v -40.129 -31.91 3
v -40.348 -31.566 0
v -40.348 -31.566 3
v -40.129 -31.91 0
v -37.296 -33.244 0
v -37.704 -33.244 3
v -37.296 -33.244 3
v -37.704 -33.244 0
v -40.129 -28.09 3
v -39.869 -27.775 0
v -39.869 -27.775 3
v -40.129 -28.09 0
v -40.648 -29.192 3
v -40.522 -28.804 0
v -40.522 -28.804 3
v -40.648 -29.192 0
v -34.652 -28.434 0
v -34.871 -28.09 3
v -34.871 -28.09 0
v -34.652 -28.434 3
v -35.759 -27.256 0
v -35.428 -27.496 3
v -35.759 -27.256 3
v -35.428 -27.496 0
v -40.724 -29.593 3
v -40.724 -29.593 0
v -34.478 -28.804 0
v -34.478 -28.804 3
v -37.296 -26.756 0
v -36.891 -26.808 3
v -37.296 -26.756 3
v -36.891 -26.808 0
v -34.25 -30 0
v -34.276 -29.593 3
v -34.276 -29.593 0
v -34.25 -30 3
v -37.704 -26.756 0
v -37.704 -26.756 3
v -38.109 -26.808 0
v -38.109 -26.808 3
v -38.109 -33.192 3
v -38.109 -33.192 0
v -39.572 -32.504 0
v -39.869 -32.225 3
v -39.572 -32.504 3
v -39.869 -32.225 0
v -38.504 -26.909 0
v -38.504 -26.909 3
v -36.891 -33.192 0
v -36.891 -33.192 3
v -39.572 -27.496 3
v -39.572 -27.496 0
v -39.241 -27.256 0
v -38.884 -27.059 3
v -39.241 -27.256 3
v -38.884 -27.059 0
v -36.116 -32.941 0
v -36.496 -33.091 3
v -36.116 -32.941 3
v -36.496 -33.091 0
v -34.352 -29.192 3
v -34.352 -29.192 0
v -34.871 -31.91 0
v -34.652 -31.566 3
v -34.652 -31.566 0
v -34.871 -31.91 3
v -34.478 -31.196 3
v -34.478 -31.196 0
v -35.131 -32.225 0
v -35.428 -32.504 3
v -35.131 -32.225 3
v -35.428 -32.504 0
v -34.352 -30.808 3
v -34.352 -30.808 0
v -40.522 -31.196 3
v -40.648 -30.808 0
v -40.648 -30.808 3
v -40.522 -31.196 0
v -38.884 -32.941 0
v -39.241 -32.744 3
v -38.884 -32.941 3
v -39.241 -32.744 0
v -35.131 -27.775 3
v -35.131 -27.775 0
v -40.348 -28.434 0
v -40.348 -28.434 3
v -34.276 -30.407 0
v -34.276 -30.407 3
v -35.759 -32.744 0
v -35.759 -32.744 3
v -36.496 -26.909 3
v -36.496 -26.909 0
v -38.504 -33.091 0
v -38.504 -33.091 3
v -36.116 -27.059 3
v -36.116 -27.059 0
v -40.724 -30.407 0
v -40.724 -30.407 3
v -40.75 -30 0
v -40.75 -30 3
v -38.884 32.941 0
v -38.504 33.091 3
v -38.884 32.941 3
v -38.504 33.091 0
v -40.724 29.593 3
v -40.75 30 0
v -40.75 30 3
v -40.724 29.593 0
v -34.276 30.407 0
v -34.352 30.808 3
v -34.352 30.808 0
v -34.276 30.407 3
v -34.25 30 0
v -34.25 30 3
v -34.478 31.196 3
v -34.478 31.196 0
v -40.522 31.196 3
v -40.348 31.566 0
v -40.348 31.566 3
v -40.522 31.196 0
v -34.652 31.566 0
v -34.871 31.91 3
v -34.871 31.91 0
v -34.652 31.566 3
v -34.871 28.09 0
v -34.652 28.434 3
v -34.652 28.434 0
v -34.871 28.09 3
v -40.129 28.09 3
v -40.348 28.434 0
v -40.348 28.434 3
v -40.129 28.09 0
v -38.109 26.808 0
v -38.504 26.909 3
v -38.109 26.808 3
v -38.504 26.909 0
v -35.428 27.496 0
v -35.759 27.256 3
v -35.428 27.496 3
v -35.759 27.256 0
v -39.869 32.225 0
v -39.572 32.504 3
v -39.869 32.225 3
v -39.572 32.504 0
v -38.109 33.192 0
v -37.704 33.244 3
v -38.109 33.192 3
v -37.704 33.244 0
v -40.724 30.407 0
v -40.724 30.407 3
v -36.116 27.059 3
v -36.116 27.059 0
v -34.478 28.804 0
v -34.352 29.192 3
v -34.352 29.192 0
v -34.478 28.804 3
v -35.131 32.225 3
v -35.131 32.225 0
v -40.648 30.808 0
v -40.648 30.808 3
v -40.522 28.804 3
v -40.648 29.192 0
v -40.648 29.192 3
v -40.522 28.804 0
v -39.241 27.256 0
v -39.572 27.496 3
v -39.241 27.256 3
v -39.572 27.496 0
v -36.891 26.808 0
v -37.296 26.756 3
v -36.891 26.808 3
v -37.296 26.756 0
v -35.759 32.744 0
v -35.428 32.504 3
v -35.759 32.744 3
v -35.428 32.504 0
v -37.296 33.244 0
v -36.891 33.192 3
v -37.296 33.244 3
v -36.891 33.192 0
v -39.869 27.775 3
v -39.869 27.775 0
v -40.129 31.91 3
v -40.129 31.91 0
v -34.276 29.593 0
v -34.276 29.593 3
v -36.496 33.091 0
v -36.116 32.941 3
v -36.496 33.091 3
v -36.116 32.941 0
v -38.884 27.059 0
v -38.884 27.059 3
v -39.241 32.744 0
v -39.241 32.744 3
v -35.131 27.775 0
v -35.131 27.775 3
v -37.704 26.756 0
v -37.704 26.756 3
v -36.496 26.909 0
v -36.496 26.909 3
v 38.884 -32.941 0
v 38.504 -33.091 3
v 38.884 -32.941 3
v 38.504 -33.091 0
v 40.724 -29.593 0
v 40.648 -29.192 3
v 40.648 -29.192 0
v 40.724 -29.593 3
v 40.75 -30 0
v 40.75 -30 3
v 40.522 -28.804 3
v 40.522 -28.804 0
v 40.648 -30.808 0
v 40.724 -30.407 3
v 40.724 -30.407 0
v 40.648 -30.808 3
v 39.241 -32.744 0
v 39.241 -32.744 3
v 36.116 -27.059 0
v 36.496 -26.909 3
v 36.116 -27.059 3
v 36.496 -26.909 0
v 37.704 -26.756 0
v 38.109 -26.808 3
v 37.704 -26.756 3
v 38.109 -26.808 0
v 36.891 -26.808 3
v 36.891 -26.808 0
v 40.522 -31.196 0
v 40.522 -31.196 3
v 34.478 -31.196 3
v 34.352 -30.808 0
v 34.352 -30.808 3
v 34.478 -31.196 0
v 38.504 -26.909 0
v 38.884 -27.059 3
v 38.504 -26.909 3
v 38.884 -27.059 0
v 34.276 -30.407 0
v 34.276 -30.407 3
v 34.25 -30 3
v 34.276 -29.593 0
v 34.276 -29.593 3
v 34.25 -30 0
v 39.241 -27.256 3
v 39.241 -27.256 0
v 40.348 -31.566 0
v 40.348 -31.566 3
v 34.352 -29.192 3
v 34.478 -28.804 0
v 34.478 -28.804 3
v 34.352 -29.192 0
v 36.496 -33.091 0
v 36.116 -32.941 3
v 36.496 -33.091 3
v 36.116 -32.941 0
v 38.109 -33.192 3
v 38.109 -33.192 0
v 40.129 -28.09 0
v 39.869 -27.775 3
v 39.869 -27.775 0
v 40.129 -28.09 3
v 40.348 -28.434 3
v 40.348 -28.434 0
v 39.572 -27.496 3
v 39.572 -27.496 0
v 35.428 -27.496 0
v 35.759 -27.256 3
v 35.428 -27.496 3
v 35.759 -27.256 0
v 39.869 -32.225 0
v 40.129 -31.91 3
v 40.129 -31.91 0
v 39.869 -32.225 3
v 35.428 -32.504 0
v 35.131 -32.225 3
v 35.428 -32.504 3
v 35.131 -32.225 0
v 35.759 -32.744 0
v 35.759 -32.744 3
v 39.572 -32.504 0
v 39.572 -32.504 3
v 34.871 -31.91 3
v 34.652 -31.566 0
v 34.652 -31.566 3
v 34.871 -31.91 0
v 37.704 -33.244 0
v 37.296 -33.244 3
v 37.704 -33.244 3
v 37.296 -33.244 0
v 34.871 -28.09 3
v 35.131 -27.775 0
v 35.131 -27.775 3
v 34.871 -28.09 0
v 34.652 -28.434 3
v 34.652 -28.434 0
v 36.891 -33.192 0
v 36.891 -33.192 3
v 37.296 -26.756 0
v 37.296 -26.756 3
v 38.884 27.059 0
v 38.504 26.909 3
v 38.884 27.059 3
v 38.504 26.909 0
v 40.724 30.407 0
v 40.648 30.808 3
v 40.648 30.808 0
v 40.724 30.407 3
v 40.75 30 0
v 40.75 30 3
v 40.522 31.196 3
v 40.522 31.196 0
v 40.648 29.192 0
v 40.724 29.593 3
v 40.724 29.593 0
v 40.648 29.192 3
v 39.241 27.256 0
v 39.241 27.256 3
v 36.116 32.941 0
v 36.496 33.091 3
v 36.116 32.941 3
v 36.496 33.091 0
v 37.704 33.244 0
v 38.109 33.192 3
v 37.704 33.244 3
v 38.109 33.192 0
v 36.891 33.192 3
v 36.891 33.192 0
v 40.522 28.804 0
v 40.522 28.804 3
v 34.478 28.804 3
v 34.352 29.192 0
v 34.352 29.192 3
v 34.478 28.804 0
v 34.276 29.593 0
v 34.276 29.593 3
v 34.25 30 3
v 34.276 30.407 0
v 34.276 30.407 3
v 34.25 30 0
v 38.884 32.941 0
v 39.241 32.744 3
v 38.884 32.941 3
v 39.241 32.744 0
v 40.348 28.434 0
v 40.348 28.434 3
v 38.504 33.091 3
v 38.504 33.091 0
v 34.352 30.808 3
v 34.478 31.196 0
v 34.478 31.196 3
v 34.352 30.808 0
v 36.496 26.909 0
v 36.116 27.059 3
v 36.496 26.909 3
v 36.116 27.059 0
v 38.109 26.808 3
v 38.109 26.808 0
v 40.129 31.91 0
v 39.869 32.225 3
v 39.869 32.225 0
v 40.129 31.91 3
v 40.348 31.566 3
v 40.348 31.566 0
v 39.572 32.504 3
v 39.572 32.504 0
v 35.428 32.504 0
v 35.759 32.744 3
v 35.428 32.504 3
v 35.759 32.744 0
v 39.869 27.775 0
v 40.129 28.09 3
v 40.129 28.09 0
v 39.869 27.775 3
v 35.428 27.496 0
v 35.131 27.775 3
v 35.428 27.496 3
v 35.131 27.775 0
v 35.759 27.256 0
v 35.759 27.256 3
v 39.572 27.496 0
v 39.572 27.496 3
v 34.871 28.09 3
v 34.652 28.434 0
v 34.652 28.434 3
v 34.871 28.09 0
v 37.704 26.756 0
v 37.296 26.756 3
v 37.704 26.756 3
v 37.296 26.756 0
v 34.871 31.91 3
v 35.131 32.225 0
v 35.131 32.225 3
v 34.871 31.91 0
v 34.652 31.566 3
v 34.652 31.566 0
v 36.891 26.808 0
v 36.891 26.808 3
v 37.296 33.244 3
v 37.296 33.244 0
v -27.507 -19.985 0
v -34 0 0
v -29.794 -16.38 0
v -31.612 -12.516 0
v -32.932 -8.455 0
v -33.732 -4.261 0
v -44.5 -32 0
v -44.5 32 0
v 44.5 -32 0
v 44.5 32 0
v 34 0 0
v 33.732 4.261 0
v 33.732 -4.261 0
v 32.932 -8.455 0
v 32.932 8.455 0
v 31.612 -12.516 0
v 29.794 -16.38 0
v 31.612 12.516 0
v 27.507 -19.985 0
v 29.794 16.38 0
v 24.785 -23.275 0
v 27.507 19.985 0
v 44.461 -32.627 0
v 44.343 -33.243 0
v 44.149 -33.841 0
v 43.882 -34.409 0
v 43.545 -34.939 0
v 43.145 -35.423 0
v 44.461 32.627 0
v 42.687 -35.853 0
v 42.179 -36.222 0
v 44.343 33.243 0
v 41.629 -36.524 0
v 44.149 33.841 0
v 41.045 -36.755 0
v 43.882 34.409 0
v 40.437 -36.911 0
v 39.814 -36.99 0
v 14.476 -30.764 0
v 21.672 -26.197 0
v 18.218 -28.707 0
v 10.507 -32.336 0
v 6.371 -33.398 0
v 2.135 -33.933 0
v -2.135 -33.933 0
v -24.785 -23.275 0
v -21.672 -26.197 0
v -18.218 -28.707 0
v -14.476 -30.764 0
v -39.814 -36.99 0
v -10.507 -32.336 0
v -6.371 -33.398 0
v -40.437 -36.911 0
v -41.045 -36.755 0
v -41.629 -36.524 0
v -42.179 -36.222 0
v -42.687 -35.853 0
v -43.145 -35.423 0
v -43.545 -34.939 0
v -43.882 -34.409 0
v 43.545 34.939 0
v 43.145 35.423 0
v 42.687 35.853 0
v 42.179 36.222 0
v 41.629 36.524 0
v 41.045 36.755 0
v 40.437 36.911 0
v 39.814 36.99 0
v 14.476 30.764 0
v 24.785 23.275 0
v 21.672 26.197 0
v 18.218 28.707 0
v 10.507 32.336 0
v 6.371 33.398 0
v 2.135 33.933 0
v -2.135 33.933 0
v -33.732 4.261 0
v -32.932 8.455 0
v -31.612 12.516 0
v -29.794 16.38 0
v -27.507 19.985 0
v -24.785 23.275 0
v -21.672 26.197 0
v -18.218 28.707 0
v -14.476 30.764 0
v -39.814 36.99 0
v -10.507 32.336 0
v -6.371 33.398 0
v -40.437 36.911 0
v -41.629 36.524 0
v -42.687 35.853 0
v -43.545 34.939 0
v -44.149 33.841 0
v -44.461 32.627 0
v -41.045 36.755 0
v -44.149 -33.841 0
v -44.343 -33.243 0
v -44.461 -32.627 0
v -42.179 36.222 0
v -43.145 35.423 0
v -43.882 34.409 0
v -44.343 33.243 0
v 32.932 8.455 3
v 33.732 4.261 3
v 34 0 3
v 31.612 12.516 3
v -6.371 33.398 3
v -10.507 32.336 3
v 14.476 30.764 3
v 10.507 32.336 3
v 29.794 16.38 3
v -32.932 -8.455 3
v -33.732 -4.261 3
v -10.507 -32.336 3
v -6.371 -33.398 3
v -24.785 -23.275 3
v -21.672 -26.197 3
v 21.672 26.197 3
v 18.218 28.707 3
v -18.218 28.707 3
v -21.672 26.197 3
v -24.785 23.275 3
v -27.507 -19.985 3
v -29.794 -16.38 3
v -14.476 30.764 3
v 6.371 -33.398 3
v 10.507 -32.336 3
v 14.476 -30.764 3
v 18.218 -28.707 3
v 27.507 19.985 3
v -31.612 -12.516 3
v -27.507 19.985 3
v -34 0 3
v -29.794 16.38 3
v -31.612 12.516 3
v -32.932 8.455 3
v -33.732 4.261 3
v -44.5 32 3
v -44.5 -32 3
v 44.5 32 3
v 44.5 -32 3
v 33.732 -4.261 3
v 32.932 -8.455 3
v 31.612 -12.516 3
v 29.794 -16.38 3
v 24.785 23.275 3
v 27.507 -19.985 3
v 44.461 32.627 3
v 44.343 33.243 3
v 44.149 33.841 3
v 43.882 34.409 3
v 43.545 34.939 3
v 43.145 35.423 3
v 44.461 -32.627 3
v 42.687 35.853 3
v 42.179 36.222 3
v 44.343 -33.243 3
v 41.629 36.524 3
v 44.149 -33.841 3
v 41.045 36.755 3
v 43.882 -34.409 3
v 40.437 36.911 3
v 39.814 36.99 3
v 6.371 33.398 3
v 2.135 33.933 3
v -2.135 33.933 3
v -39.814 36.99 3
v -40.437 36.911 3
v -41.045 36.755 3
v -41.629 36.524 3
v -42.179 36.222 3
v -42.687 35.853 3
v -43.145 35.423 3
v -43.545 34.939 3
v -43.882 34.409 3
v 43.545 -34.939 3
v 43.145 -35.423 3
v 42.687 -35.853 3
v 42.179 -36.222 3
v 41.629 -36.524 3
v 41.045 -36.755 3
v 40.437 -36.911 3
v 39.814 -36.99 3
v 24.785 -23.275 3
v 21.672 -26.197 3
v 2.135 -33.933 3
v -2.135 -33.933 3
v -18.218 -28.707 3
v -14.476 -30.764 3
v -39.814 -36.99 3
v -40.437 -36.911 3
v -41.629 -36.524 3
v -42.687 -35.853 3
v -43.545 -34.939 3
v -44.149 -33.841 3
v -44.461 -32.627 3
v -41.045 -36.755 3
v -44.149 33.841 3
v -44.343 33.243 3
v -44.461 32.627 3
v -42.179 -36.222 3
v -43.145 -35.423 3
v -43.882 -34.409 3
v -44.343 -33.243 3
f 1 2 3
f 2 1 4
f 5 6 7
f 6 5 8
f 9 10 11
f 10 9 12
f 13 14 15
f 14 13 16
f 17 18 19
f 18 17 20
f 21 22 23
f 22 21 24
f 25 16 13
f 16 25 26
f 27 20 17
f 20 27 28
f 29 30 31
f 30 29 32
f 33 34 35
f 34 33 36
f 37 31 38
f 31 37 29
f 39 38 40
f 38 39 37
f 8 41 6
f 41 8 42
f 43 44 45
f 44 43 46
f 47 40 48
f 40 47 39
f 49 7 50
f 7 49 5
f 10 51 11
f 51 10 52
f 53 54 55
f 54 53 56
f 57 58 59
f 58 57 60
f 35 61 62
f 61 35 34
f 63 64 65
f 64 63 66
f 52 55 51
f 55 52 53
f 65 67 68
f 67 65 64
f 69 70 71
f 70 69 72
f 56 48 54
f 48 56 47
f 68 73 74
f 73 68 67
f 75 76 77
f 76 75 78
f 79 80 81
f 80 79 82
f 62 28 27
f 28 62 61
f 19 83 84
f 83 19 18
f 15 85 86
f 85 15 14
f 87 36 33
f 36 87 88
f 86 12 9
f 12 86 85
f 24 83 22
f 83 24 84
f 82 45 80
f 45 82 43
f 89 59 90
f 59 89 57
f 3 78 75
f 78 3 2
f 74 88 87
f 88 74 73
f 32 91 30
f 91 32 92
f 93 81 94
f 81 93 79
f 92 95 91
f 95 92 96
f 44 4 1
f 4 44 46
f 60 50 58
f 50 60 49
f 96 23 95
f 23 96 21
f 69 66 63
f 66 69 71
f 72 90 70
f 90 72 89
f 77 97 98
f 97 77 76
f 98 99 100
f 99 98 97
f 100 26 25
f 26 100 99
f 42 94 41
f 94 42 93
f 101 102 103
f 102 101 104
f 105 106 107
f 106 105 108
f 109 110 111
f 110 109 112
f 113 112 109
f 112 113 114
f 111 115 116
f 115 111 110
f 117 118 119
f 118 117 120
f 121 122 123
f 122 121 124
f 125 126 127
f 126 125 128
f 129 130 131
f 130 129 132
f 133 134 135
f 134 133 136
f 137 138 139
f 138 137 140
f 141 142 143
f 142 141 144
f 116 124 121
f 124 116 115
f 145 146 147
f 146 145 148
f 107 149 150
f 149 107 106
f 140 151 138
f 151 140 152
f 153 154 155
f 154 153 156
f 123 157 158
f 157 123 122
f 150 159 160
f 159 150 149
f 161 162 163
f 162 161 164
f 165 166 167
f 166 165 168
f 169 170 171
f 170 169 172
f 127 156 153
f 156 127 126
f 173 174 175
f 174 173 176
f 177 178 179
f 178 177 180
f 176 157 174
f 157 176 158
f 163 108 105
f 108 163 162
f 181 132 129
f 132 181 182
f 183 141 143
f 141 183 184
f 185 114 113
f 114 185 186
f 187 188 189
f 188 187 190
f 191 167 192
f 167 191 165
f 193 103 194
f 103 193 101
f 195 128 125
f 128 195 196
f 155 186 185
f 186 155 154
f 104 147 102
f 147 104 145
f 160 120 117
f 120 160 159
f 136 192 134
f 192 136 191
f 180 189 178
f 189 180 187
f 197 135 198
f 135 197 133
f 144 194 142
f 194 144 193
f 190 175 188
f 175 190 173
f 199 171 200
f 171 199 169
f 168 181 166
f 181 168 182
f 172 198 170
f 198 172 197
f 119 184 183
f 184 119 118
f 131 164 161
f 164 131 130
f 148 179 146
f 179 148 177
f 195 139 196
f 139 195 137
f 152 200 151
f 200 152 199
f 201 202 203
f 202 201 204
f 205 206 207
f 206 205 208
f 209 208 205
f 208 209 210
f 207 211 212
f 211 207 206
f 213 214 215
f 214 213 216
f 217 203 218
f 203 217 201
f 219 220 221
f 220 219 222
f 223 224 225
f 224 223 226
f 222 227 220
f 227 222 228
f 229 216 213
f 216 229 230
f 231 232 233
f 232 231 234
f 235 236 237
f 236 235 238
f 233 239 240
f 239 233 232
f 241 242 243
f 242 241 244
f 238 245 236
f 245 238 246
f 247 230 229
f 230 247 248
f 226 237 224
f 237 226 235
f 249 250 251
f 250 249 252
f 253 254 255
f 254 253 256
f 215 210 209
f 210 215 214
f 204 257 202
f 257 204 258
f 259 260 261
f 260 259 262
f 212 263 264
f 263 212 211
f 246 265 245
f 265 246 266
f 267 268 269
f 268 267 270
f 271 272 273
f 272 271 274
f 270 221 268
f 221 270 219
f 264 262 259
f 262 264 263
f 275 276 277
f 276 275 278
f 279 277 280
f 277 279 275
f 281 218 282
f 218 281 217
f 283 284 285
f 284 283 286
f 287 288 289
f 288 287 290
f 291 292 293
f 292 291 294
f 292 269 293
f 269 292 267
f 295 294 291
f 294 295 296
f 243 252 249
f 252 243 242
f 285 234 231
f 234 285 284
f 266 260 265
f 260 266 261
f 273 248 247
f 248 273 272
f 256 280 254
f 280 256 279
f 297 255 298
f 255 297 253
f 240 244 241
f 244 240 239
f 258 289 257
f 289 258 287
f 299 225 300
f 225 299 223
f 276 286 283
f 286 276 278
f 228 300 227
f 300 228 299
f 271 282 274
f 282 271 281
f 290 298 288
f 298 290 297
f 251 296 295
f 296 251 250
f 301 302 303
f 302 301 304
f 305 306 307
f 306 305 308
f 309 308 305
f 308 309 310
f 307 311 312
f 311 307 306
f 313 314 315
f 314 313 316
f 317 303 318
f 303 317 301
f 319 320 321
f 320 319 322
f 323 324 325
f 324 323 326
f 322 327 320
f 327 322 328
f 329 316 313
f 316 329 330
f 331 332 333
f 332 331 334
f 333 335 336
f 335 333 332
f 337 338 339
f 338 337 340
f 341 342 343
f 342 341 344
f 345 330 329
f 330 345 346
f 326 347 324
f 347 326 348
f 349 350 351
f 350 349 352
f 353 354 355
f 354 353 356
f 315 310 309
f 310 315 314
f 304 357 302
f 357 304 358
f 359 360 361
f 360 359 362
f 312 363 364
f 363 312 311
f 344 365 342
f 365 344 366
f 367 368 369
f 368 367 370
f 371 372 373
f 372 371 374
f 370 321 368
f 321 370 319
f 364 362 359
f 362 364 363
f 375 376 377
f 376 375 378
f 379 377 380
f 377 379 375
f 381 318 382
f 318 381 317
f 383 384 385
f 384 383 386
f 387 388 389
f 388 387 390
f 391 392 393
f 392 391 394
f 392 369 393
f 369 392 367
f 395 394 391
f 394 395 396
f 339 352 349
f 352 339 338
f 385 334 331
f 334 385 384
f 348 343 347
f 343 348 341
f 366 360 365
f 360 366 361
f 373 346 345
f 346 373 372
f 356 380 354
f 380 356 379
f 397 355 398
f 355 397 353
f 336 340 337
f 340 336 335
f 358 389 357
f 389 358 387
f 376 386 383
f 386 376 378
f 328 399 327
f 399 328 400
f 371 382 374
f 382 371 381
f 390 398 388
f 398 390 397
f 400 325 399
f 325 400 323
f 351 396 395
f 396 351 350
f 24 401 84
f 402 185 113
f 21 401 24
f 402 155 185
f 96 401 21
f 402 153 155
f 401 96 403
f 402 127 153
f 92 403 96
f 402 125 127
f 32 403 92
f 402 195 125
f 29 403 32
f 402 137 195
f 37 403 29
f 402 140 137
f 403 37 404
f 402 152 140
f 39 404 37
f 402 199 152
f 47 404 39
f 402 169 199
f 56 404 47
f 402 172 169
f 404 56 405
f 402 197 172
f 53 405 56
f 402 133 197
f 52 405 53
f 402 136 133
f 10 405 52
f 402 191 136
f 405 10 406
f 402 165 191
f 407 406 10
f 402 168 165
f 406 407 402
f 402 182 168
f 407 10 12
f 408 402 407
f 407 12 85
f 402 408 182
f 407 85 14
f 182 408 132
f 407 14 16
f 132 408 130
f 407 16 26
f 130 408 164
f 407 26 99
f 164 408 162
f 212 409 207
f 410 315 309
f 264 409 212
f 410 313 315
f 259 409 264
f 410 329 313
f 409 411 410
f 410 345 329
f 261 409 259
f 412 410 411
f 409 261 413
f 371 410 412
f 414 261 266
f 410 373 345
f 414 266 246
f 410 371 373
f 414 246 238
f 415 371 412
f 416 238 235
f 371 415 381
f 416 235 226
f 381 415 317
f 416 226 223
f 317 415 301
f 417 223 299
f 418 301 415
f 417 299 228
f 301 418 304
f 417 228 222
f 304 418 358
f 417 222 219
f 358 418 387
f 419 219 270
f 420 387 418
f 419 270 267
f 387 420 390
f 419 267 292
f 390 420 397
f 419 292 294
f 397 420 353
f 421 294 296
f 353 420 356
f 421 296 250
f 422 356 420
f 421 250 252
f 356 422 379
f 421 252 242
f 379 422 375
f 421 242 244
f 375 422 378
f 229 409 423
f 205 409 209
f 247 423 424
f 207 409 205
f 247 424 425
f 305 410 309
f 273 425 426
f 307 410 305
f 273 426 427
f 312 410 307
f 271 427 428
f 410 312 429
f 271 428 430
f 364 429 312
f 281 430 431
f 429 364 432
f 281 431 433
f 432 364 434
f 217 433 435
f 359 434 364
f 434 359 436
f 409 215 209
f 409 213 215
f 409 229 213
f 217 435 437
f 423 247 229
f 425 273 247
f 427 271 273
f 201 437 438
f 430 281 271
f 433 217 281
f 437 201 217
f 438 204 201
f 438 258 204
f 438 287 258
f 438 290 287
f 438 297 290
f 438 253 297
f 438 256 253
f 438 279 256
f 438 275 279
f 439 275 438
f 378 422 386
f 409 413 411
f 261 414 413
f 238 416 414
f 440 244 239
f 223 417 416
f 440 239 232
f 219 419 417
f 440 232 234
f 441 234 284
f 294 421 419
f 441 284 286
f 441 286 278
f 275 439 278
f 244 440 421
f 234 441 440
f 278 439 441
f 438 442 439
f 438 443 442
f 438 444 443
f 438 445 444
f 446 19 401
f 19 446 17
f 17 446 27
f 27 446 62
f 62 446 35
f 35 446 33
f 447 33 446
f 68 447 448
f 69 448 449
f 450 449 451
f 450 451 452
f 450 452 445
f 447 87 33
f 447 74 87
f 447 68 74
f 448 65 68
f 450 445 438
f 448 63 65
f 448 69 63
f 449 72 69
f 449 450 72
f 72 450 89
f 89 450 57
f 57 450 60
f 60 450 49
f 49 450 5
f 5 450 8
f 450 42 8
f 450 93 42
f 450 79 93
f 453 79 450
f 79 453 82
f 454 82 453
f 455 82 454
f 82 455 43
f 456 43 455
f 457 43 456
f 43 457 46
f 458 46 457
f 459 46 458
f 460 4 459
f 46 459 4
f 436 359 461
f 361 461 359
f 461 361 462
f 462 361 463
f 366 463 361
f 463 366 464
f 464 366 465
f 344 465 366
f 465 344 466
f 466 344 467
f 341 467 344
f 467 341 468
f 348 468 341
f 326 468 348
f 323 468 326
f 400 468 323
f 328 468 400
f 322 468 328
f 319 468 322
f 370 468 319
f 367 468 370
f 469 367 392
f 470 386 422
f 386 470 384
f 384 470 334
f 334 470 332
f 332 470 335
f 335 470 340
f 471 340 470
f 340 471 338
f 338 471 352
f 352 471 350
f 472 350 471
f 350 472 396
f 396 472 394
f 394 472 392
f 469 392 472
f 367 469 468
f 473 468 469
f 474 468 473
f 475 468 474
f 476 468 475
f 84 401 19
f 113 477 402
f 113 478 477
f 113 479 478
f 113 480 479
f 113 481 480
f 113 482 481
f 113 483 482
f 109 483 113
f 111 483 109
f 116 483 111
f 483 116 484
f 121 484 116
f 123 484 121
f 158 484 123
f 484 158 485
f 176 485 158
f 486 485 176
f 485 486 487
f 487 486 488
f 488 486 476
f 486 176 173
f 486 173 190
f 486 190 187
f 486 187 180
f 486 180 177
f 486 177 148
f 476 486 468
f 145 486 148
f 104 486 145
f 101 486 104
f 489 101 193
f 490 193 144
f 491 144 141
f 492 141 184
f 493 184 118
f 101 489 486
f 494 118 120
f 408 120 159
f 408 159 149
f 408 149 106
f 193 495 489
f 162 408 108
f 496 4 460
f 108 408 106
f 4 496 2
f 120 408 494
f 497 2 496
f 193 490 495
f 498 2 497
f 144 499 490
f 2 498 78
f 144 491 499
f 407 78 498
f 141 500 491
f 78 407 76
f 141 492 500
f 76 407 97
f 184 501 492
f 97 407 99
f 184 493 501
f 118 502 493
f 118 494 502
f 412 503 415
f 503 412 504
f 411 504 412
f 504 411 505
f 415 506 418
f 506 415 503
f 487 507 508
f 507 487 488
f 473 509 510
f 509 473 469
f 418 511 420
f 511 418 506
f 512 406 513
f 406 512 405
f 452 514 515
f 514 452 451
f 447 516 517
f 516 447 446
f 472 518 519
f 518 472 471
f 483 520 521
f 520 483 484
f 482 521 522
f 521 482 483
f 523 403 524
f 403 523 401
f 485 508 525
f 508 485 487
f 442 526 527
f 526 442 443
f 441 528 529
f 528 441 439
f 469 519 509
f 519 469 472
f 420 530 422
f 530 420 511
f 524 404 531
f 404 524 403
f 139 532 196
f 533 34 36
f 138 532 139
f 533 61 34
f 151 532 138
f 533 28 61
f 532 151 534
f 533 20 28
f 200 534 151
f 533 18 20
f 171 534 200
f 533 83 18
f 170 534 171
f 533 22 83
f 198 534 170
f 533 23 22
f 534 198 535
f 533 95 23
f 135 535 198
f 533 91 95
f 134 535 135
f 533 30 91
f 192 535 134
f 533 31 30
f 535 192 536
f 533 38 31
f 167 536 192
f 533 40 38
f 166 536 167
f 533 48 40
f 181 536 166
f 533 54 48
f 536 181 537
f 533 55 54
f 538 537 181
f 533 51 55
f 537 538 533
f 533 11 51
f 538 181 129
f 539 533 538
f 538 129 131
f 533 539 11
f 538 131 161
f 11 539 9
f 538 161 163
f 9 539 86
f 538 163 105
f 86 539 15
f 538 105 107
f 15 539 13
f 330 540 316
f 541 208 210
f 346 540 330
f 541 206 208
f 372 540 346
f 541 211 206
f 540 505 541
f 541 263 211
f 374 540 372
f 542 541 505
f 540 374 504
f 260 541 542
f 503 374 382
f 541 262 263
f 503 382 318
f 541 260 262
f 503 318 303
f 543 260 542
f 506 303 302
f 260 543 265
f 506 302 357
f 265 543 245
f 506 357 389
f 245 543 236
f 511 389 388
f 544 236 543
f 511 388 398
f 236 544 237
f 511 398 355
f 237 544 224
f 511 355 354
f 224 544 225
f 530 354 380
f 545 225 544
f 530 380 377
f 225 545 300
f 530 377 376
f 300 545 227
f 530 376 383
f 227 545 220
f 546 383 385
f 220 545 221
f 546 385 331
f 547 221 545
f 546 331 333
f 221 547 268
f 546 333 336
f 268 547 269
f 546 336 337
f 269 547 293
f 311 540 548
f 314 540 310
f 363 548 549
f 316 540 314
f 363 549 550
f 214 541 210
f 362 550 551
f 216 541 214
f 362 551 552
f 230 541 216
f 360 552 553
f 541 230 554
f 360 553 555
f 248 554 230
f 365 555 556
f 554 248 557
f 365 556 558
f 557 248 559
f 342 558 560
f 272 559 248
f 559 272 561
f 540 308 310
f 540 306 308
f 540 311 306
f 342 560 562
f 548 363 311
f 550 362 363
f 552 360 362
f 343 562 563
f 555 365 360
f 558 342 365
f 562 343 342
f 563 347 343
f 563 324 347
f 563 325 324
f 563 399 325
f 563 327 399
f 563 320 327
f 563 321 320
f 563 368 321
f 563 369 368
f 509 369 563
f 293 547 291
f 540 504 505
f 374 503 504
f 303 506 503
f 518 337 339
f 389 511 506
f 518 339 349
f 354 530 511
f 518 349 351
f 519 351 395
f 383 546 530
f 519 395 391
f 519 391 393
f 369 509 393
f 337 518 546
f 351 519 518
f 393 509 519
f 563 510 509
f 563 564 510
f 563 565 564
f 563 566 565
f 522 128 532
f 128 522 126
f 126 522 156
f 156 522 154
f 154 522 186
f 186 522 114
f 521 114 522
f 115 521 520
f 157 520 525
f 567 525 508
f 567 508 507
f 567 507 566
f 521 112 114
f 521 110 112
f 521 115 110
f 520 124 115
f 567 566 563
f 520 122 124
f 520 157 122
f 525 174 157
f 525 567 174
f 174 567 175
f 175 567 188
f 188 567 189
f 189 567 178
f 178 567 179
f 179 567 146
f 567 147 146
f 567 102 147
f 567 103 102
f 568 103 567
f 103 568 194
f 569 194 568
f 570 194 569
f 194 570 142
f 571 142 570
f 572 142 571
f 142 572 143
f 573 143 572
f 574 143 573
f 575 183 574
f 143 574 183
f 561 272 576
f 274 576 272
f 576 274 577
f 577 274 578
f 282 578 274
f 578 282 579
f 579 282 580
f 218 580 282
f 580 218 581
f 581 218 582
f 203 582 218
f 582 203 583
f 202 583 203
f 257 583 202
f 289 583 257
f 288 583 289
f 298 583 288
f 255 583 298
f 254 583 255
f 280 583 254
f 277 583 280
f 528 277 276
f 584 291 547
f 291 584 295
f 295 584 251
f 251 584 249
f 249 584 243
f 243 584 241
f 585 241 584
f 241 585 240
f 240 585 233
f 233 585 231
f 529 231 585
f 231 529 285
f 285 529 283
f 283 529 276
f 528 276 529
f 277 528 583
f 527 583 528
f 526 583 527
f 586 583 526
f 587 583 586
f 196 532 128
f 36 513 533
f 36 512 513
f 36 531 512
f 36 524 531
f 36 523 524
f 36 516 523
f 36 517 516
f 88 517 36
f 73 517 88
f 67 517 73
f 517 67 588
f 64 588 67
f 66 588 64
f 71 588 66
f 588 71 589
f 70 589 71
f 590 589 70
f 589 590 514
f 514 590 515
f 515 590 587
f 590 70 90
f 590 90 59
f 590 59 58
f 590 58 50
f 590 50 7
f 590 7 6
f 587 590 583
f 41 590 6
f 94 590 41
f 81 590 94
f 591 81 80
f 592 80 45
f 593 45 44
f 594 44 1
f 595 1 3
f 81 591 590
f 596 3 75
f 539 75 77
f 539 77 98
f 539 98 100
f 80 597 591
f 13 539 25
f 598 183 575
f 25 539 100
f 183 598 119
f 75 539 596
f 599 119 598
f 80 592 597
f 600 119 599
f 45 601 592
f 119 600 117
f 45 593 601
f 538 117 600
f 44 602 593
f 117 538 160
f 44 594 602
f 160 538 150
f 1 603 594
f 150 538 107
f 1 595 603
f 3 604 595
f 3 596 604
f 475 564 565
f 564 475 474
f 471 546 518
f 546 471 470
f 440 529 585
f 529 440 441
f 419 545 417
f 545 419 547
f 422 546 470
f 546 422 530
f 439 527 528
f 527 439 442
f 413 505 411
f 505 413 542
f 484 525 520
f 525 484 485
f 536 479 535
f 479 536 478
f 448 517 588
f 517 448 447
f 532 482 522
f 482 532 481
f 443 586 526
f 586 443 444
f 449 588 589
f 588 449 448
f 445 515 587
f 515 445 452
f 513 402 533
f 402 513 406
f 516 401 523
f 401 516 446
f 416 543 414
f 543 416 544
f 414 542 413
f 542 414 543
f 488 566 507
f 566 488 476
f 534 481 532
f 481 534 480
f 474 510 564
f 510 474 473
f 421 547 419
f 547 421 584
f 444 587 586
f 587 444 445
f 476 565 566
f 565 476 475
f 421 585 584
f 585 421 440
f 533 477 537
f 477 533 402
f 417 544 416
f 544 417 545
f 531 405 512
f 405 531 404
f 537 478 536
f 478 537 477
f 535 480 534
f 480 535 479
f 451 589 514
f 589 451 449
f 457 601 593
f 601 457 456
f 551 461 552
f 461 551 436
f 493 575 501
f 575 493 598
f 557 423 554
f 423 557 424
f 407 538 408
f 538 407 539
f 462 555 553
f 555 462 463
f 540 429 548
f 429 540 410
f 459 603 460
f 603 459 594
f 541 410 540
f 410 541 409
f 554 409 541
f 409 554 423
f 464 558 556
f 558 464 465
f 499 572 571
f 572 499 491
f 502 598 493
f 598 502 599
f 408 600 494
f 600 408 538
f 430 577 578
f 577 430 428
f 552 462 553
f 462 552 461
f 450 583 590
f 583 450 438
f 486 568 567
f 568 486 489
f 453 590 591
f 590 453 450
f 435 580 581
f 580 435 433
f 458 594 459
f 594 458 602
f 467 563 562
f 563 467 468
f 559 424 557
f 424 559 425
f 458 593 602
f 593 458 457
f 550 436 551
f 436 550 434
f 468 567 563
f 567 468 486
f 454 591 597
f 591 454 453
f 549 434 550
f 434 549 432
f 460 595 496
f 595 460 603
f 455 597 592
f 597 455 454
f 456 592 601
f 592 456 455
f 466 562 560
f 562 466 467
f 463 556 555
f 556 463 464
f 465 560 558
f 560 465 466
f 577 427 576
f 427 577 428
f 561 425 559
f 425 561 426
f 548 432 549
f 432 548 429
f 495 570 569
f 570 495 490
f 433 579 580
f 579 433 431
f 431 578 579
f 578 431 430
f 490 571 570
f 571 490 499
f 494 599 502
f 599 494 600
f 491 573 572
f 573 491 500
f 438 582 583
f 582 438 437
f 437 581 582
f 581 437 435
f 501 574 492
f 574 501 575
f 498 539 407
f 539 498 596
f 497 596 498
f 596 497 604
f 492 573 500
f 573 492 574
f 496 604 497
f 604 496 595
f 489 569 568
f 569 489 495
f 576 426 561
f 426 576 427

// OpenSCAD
$fn = 50;


difference() {
	union() {
		hull() {
			translate(v = [-39.5000000000, 32.0000000000, 0]) {
				cylinder(h = 3, r = 5);
			}
			translate(v = [39.5000000000, 32.0000000000, 0]) {
				cylinder(h = 3, r = 5);
			}
			translate(v = [-39.5000000000, -32.0000000000, 0]) {
				cylinder(h = 3, r = 5);
			}
			translate(v = [39.5000000000, -32.0000000000, 0]) {
				cylinder(h = 3, r = 5);
			}
		}
	}
	union() {
		#translate(v = [-37.5000000000, -30.0000000000, -100.0000000000]) {
			cylinder(h = 200, r = 3.2500000000);
		}
		#translate(v = [-37.5000000000, 30.0000000000, -100.0000000000]) {
			cylinder(h = 200, r = 3.2500000000);
		}
		#translate(v = [37.5000000000, -30.0000000000, -100.0000000000]) {
			cylinder(h = 200, r = 3.2500000000);
		}
		#translate(v = [37.5000000000, 30.0000000000, -100.0000000000]) {
			cylinder(h = 200, r = 3.2500000000);
		}
		#cylinder(h = 3, r = 34.0000000000);
	}
}
